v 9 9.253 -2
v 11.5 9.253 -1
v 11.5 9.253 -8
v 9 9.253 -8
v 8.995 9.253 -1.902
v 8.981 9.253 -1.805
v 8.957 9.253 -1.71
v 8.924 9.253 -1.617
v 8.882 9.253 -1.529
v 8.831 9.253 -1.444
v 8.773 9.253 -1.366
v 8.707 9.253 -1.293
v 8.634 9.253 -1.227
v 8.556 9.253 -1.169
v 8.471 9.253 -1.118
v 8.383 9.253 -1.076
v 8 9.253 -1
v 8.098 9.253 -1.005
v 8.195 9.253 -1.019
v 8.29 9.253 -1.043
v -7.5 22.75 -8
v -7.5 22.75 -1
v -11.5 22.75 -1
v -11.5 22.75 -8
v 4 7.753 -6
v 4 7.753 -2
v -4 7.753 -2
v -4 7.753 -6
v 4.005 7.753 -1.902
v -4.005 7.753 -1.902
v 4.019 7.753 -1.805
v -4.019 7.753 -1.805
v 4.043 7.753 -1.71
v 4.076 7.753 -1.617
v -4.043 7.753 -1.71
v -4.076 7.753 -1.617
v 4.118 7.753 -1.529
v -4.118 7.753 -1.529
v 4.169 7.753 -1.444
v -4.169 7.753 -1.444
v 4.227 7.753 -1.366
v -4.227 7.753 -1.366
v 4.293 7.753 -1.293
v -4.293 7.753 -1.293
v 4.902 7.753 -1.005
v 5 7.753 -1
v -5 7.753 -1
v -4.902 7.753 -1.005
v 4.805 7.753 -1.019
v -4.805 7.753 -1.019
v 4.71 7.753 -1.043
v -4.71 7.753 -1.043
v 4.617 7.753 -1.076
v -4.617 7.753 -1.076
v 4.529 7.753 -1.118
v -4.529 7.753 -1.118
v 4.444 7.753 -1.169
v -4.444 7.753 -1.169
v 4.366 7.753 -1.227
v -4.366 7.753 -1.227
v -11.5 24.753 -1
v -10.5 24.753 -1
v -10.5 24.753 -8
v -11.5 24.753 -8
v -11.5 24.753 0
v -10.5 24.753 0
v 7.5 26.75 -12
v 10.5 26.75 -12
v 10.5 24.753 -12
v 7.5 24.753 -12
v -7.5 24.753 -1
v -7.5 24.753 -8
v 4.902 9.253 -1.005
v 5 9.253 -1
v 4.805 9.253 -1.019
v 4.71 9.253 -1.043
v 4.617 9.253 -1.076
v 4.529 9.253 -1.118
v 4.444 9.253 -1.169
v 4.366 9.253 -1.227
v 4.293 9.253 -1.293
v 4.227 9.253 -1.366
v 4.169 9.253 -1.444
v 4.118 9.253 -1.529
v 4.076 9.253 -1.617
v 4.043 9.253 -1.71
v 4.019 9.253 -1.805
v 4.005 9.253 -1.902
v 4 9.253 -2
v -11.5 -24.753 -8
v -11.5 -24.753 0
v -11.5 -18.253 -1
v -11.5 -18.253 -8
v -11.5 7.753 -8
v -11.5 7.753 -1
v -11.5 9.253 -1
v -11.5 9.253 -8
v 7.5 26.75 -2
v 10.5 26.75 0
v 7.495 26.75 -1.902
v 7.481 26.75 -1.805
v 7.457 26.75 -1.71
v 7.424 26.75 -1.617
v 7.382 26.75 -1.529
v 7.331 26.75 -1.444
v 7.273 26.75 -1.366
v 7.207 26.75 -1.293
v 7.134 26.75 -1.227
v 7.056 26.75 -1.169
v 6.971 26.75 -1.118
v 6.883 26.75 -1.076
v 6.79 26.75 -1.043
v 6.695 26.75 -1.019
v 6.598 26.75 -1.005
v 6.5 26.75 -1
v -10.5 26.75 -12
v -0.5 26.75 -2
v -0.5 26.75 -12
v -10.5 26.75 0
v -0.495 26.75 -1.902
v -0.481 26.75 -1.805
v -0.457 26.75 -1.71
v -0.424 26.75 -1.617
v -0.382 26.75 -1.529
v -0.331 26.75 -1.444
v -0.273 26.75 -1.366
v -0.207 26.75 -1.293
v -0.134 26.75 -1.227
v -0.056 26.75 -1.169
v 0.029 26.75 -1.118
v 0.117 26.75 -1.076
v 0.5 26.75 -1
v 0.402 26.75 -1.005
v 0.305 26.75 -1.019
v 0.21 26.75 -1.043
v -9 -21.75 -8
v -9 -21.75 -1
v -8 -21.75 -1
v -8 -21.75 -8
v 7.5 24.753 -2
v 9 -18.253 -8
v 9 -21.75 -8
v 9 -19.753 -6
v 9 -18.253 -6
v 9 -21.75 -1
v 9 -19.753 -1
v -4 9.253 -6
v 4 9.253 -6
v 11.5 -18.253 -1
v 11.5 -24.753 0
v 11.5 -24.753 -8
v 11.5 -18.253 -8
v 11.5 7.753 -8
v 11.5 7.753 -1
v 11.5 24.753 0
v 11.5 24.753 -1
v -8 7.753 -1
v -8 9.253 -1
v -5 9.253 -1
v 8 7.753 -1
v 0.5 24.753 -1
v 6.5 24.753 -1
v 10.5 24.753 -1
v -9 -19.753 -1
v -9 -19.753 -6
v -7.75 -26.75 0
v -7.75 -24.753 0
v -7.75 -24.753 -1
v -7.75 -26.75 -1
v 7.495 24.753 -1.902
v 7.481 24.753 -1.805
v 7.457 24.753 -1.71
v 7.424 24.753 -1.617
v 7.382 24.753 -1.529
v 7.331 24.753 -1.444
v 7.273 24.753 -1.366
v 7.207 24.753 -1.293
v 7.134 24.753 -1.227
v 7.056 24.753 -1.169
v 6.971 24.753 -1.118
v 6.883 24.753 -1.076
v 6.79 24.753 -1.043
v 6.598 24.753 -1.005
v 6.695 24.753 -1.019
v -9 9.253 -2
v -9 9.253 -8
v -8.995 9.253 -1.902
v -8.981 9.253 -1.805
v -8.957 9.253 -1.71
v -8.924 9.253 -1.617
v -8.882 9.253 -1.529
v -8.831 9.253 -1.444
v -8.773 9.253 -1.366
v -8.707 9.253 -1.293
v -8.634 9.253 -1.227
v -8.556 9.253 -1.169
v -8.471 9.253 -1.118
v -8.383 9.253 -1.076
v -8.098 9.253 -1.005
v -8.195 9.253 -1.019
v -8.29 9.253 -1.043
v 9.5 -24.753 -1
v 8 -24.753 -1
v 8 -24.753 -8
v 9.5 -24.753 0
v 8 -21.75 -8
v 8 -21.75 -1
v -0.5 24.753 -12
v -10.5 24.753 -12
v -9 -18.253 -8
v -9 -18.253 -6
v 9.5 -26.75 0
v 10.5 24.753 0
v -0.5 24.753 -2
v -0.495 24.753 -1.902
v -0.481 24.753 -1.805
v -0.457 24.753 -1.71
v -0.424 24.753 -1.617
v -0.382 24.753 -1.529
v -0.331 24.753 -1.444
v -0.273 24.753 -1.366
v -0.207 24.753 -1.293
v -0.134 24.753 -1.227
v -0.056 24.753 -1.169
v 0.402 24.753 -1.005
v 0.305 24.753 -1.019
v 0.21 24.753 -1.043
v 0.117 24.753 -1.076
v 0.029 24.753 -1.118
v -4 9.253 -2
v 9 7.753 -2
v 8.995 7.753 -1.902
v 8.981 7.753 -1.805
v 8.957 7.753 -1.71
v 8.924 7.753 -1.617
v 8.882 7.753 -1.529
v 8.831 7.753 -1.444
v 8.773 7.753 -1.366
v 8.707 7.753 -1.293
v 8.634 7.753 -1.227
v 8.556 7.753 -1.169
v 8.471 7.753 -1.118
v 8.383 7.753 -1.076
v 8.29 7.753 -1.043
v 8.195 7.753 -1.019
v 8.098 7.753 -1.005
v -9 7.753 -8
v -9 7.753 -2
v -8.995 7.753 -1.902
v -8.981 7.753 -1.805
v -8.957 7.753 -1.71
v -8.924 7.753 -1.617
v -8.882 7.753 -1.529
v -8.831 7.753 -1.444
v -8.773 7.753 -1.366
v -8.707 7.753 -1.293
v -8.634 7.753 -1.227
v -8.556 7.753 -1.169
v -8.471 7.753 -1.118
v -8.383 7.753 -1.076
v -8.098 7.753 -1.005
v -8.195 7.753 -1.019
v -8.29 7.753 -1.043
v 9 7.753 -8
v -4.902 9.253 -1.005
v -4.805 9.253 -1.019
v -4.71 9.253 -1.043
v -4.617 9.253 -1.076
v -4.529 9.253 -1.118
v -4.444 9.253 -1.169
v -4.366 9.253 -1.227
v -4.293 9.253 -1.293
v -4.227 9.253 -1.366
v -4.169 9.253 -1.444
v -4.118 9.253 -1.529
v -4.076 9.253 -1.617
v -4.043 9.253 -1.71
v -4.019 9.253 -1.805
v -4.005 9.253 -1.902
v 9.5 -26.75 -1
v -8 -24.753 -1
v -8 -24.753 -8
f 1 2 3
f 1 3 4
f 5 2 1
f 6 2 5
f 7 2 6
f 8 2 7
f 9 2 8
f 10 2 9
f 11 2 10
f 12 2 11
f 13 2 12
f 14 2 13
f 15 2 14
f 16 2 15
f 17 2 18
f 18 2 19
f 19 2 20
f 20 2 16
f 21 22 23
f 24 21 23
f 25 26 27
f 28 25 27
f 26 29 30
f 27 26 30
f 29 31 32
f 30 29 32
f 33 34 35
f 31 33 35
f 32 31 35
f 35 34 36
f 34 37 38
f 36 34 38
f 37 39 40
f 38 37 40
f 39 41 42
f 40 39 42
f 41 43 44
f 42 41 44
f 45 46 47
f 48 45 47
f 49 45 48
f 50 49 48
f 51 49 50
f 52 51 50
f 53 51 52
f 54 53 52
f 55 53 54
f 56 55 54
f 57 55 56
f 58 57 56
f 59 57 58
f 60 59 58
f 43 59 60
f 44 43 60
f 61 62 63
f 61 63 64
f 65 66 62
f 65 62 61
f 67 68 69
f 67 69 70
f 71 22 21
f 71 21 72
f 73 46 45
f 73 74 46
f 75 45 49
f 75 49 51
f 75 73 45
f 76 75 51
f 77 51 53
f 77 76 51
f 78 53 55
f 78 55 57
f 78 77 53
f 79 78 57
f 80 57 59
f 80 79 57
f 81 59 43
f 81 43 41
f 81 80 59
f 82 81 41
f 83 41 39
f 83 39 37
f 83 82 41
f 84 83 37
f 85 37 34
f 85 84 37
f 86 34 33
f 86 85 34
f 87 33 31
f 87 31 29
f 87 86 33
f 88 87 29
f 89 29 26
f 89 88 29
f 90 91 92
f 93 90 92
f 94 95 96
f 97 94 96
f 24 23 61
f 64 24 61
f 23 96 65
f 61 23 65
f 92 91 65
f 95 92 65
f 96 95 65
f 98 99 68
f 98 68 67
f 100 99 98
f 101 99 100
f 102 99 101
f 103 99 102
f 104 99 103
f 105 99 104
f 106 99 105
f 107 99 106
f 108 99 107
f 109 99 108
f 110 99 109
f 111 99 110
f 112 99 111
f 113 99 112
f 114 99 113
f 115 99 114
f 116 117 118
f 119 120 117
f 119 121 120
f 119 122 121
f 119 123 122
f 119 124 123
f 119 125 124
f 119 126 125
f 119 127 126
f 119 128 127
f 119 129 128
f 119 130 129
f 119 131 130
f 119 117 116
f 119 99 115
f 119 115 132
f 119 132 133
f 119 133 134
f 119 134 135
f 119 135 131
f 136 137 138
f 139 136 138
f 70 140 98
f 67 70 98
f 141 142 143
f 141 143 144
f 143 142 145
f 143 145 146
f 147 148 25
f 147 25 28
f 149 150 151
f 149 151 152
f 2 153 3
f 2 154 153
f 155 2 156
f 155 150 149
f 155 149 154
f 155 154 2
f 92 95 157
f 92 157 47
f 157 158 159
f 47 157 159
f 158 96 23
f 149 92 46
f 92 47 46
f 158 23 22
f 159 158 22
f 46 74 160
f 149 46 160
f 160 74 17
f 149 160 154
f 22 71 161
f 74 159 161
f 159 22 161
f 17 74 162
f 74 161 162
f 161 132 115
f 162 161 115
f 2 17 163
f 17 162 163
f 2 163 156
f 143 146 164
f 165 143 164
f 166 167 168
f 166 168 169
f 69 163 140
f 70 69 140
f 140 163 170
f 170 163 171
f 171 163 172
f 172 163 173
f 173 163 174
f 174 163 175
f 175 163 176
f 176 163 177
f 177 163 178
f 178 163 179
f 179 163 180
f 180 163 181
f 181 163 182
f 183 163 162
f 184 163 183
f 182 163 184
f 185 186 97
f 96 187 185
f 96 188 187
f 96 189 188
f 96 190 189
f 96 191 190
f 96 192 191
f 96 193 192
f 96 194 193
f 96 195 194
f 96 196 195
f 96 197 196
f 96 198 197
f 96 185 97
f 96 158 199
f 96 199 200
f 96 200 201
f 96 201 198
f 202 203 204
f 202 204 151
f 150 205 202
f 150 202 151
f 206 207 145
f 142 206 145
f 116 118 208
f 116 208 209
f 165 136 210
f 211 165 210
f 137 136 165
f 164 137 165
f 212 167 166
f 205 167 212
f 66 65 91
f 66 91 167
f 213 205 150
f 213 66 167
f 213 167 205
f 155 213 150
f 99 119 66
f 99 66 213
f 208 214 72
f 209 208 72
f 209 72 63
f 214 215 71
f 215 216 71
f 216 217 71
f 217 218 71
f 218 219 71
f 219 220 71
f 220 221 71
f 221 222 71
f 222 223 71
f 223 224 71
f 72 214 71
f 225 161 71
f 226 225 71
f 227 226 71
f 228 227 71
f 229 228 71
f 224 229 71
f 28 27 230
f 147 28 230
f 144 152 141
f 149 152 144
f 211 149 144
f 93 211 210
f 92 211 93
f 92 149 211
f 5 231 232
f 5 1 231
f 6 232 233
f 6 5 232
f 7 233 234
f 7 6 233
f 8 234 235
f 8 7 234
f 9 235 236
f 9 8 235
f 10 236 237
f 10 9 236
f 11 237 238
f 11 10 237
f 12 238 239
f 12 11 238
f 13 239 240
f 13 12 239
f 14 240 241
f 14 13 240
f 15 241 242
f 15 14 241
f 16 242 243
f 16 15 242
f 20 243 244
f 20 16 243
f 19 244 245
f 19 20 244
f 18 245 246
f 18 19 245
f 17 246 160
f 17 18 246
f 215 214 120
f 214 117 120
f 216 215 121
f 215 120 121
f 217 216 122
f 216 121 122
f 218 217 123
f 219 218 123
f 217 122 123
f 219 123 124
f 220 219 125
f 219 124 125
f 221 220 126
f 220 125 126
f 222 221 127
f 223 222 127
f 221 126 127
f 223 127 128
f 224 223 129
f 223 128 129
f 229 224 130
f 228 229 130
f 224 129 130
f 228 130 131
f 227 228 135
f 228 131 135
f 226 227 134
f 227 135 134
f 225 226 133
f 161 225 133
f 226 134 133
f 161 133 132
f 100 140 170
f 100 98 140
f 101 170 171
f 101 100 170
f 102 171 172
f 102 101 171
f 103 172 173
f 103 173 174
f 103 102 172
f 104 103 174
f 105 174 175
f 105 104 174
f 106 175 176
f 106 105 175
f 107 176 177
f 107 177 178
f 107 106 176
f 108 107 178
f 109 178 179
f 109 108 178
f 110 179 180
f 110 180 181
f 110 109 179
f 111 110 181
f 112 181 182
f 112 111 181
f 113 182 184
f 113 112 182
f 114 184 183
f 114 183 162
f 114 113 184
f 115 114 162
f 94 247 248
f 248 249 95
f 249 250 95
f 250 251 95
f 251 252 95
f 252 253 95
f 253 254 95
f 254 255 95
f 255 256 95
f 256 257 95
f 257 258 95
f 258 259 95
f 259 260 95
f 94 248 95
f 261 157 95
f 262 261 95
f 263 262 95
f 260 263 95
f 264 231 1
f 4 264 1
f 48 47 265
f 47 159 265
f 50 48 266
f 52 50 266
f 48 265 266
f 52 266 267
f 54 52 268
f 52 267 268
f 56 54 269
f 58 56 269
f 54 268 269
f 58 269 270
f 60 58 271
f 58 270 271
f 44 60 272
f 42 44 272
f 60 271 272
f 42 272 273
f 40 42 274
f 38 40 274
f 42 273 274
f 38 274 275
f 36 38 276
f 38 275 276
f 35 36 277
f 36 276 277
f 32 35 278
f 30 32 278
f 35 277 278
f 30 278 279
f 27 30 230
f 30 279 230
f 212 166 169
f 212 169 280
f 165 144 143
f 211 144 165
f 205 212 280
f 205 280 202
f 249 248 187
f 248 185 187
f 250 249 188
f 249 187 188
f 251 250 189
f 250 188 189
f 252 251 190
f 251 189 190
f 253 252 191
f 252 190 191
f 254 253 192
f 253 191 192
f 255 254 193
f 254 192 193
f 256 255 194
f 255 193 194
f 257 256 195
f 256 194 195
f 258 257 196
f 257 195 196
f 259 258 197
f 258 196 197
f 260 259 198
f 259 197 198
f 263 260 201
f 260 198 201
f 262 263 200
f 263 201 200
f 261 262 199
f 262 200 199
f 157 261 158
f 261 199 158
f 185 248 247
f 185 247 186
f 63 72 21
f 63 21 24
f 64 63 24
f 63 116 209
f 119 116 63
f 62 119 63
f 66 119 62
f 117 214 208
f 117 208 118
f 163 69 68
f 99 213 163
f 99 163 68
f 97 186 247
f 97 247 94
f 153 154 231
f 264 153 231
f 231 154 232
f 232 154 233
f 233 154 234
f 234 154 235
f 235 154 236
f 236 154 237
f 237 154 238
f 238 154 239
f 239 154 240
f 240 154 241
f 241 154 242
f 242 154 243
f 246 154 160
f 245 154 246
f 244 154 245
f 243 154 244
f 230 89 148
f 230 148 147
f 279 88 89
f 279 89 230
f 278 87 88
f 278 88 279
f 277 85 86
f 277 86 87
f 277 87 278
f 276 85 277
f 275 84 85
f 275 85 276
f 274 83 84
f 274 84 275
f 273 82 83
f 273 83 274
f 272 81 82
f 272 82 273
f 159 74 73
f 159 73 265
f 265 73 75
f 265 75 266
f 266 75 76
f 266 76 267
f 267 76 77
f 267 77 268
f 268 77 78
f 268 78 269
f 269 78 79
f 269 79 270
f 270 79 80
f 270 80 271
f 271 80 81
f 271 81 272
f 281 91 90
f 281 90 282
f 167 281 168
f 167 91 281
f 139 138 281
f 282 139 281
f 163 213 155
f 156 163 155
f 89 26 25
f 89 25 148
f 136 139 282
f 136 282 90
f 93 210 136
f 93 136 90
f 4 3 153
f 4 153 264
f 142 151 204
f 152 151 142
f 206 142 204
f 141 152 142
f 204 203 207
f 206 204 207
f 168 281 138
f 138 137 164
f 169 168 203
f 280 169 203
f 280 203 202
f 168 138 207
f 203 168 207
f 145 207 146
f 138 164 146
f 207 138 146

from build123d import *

# Parameters (mm, degrees)
SKETCH1_W           = 21
SKETCH1_H           = 1.747373259
SKETCH1_H_2         = 0.25
SKETCH1_W_2         = 23
SKETCH1_H_3         = 49.505253482
SKETCH1_W_3         = 17.25
BOSS_EXTRUDE1_DEPTH = 1
SKETCH2_W           = 23
SKETCH2_H           = 1.5
SKETCH2_W_2         = 2.5
SKETCH2_W_3         = 8
BOSS_EXTRUDE2_DEPTH = 5
SKETCH3_W           = 2.5
SKETCH3_H           = 1.5
BOSS_EXTRUDE3_DEPTH = 2
SKETCH4_W           = 3
SKETCH4_H           = 1.997373259
SKETCH4_W_2         = 10
BOSS_EXTRUDE4_DEPTH = 11
SKETCH5_W           = 4
SKETCH5_H           = 2.002626741
BOSS_EXTRUDE5_DEPTH = 7
FILLET1_R           = 1


with BuildPart() as part:
    # Sketch1 → Boss-Extrude1 (new body)
    with BuildSketch(Plane.XY):
        with Locations((0, 25.876313371)):
            Rectangle(SKETCH1_W, SKETCH1_H)
        with Locations((0, 24.877626741)):
            Rectangle(SKETCH1_W, SKETCH1_H_2)
        Rectangle(SKETCH1_W_2, SKETCH1_H_3)
        with Locations((0.875, -24.877626741)):
            Rectangle(SKETCH1_W_3, SKETCH1_H_2)
        with Locations((0.875, -25.876313371)):
            Rectangle(SKETCH1_W_3, SKETCH1_H)
    extrude(amount=-BOSS_EXTRUDE1_DEPTH)

    # Sketch2 → Boss-Extrude2 (add)
    with BuildSketch(Plane(origin=(0, 0, -1), x_dir=(-1, 0, 0), z_dir=(0, 0, -1))):
        with Locations((0, -19.002626741)):
            Rectangle(SKETCH2_W, SKETCH2_H)
        with Locations((-10.25, 8.502626741)):
            Rectangle(SKETCH2_W_2, SKETCH2_H)
        with Locations((0, 8.502626741)):
            Rectangle(SKETCH2_W_3, SKETCH2_H)
        with Locations((10.25, 8.502626741)):
            Rectangle(SKETCH2_W_2, SKETCH2_H)
    extrude(amount=BOSS_EXTRUDE2_DEPTH)

    # Sketch3 → Boss-Extrude3 (add)
    with BuildSketch(Plane(origin=(0, 0, -6), x_dir=(-1, 0, 0), z_dir=(0, 0, -1))):
        with Locations((-10.25, 8.502626741)):
            Rectangle(SKETCH3_W, SKETCH3_H)
        with Locations((10.25, 8.502626741)):
            Rectangle(SKETCH3_W, SKETCH3_H)
        with Locations((-10.25, -19.002626741)):
            Rectangle(SKETCH3_W, SKETCH3_H)
        with Locations((10.25, -19.002626741)):
            Rectangle(SKETCH3_W, SKETCH3_H)
    extrude(amount=BOSS_EXTRUDE3_DEPTH)

    # Sketch4 → Boss-Extrude4 (add)
    with BuildSketch(Plane(origin=(0, 0, -1), x_dir=(-1, 0, 0), z_dir=(0, 0, -1))):
        with Locations((-9, 25.751313371)):
            Rectangle(SKETCH4_W, SKETCH4_H)
        with Locations((5.5, 25.751313371)):
            Rectangle(SKETCH4_W_2, SKETCH4_H)
    extrude(amount=BOSS_EXTRUDE4_DEPTH)

    # Sketch5 → Boss-Extrude5 (add)
    with BuildSketch(Plane(origin=(0, 0, -1), x_dir=(-1, 0, 0), z_dir=(0, 0, -1))):
        with Locations((9.5, 23.751313371)):
            Rectangle(SKETCH5_W, SKETCH5_H)
        Polygon((8, -24.752626741), (11.5, -24.752626741), (11.5, -19.752626741), (9, -19.752626741), (9, -21.75), (8, -21.75), align=None)
        Polygon((-11.5, -24.752626741), (-8, -24.752626741), (-8, -21.75), (-9, -21.75), (-9, -19.752626741), (-11.5, -19.752626741), align=None)
    extrude(amount=BOSS_EXTRUDE5_DEPTH)

    # Fillet1
    fillet1_edges = [part.edges().sort_by_distance(p)[0] for p in [
        (7.5, 25.75131337, -1),
        (-0.5, 25.75131337, -1),
        (-4, 8.502626741, -1),
        (4, 8.502626741, -1),
        (9, 8.502626741, -1),
        (-9, 8.502626741, -1),
    ]]
    fillet(fillet1_edges, radius=FILLET1_R)


solid = part.part
